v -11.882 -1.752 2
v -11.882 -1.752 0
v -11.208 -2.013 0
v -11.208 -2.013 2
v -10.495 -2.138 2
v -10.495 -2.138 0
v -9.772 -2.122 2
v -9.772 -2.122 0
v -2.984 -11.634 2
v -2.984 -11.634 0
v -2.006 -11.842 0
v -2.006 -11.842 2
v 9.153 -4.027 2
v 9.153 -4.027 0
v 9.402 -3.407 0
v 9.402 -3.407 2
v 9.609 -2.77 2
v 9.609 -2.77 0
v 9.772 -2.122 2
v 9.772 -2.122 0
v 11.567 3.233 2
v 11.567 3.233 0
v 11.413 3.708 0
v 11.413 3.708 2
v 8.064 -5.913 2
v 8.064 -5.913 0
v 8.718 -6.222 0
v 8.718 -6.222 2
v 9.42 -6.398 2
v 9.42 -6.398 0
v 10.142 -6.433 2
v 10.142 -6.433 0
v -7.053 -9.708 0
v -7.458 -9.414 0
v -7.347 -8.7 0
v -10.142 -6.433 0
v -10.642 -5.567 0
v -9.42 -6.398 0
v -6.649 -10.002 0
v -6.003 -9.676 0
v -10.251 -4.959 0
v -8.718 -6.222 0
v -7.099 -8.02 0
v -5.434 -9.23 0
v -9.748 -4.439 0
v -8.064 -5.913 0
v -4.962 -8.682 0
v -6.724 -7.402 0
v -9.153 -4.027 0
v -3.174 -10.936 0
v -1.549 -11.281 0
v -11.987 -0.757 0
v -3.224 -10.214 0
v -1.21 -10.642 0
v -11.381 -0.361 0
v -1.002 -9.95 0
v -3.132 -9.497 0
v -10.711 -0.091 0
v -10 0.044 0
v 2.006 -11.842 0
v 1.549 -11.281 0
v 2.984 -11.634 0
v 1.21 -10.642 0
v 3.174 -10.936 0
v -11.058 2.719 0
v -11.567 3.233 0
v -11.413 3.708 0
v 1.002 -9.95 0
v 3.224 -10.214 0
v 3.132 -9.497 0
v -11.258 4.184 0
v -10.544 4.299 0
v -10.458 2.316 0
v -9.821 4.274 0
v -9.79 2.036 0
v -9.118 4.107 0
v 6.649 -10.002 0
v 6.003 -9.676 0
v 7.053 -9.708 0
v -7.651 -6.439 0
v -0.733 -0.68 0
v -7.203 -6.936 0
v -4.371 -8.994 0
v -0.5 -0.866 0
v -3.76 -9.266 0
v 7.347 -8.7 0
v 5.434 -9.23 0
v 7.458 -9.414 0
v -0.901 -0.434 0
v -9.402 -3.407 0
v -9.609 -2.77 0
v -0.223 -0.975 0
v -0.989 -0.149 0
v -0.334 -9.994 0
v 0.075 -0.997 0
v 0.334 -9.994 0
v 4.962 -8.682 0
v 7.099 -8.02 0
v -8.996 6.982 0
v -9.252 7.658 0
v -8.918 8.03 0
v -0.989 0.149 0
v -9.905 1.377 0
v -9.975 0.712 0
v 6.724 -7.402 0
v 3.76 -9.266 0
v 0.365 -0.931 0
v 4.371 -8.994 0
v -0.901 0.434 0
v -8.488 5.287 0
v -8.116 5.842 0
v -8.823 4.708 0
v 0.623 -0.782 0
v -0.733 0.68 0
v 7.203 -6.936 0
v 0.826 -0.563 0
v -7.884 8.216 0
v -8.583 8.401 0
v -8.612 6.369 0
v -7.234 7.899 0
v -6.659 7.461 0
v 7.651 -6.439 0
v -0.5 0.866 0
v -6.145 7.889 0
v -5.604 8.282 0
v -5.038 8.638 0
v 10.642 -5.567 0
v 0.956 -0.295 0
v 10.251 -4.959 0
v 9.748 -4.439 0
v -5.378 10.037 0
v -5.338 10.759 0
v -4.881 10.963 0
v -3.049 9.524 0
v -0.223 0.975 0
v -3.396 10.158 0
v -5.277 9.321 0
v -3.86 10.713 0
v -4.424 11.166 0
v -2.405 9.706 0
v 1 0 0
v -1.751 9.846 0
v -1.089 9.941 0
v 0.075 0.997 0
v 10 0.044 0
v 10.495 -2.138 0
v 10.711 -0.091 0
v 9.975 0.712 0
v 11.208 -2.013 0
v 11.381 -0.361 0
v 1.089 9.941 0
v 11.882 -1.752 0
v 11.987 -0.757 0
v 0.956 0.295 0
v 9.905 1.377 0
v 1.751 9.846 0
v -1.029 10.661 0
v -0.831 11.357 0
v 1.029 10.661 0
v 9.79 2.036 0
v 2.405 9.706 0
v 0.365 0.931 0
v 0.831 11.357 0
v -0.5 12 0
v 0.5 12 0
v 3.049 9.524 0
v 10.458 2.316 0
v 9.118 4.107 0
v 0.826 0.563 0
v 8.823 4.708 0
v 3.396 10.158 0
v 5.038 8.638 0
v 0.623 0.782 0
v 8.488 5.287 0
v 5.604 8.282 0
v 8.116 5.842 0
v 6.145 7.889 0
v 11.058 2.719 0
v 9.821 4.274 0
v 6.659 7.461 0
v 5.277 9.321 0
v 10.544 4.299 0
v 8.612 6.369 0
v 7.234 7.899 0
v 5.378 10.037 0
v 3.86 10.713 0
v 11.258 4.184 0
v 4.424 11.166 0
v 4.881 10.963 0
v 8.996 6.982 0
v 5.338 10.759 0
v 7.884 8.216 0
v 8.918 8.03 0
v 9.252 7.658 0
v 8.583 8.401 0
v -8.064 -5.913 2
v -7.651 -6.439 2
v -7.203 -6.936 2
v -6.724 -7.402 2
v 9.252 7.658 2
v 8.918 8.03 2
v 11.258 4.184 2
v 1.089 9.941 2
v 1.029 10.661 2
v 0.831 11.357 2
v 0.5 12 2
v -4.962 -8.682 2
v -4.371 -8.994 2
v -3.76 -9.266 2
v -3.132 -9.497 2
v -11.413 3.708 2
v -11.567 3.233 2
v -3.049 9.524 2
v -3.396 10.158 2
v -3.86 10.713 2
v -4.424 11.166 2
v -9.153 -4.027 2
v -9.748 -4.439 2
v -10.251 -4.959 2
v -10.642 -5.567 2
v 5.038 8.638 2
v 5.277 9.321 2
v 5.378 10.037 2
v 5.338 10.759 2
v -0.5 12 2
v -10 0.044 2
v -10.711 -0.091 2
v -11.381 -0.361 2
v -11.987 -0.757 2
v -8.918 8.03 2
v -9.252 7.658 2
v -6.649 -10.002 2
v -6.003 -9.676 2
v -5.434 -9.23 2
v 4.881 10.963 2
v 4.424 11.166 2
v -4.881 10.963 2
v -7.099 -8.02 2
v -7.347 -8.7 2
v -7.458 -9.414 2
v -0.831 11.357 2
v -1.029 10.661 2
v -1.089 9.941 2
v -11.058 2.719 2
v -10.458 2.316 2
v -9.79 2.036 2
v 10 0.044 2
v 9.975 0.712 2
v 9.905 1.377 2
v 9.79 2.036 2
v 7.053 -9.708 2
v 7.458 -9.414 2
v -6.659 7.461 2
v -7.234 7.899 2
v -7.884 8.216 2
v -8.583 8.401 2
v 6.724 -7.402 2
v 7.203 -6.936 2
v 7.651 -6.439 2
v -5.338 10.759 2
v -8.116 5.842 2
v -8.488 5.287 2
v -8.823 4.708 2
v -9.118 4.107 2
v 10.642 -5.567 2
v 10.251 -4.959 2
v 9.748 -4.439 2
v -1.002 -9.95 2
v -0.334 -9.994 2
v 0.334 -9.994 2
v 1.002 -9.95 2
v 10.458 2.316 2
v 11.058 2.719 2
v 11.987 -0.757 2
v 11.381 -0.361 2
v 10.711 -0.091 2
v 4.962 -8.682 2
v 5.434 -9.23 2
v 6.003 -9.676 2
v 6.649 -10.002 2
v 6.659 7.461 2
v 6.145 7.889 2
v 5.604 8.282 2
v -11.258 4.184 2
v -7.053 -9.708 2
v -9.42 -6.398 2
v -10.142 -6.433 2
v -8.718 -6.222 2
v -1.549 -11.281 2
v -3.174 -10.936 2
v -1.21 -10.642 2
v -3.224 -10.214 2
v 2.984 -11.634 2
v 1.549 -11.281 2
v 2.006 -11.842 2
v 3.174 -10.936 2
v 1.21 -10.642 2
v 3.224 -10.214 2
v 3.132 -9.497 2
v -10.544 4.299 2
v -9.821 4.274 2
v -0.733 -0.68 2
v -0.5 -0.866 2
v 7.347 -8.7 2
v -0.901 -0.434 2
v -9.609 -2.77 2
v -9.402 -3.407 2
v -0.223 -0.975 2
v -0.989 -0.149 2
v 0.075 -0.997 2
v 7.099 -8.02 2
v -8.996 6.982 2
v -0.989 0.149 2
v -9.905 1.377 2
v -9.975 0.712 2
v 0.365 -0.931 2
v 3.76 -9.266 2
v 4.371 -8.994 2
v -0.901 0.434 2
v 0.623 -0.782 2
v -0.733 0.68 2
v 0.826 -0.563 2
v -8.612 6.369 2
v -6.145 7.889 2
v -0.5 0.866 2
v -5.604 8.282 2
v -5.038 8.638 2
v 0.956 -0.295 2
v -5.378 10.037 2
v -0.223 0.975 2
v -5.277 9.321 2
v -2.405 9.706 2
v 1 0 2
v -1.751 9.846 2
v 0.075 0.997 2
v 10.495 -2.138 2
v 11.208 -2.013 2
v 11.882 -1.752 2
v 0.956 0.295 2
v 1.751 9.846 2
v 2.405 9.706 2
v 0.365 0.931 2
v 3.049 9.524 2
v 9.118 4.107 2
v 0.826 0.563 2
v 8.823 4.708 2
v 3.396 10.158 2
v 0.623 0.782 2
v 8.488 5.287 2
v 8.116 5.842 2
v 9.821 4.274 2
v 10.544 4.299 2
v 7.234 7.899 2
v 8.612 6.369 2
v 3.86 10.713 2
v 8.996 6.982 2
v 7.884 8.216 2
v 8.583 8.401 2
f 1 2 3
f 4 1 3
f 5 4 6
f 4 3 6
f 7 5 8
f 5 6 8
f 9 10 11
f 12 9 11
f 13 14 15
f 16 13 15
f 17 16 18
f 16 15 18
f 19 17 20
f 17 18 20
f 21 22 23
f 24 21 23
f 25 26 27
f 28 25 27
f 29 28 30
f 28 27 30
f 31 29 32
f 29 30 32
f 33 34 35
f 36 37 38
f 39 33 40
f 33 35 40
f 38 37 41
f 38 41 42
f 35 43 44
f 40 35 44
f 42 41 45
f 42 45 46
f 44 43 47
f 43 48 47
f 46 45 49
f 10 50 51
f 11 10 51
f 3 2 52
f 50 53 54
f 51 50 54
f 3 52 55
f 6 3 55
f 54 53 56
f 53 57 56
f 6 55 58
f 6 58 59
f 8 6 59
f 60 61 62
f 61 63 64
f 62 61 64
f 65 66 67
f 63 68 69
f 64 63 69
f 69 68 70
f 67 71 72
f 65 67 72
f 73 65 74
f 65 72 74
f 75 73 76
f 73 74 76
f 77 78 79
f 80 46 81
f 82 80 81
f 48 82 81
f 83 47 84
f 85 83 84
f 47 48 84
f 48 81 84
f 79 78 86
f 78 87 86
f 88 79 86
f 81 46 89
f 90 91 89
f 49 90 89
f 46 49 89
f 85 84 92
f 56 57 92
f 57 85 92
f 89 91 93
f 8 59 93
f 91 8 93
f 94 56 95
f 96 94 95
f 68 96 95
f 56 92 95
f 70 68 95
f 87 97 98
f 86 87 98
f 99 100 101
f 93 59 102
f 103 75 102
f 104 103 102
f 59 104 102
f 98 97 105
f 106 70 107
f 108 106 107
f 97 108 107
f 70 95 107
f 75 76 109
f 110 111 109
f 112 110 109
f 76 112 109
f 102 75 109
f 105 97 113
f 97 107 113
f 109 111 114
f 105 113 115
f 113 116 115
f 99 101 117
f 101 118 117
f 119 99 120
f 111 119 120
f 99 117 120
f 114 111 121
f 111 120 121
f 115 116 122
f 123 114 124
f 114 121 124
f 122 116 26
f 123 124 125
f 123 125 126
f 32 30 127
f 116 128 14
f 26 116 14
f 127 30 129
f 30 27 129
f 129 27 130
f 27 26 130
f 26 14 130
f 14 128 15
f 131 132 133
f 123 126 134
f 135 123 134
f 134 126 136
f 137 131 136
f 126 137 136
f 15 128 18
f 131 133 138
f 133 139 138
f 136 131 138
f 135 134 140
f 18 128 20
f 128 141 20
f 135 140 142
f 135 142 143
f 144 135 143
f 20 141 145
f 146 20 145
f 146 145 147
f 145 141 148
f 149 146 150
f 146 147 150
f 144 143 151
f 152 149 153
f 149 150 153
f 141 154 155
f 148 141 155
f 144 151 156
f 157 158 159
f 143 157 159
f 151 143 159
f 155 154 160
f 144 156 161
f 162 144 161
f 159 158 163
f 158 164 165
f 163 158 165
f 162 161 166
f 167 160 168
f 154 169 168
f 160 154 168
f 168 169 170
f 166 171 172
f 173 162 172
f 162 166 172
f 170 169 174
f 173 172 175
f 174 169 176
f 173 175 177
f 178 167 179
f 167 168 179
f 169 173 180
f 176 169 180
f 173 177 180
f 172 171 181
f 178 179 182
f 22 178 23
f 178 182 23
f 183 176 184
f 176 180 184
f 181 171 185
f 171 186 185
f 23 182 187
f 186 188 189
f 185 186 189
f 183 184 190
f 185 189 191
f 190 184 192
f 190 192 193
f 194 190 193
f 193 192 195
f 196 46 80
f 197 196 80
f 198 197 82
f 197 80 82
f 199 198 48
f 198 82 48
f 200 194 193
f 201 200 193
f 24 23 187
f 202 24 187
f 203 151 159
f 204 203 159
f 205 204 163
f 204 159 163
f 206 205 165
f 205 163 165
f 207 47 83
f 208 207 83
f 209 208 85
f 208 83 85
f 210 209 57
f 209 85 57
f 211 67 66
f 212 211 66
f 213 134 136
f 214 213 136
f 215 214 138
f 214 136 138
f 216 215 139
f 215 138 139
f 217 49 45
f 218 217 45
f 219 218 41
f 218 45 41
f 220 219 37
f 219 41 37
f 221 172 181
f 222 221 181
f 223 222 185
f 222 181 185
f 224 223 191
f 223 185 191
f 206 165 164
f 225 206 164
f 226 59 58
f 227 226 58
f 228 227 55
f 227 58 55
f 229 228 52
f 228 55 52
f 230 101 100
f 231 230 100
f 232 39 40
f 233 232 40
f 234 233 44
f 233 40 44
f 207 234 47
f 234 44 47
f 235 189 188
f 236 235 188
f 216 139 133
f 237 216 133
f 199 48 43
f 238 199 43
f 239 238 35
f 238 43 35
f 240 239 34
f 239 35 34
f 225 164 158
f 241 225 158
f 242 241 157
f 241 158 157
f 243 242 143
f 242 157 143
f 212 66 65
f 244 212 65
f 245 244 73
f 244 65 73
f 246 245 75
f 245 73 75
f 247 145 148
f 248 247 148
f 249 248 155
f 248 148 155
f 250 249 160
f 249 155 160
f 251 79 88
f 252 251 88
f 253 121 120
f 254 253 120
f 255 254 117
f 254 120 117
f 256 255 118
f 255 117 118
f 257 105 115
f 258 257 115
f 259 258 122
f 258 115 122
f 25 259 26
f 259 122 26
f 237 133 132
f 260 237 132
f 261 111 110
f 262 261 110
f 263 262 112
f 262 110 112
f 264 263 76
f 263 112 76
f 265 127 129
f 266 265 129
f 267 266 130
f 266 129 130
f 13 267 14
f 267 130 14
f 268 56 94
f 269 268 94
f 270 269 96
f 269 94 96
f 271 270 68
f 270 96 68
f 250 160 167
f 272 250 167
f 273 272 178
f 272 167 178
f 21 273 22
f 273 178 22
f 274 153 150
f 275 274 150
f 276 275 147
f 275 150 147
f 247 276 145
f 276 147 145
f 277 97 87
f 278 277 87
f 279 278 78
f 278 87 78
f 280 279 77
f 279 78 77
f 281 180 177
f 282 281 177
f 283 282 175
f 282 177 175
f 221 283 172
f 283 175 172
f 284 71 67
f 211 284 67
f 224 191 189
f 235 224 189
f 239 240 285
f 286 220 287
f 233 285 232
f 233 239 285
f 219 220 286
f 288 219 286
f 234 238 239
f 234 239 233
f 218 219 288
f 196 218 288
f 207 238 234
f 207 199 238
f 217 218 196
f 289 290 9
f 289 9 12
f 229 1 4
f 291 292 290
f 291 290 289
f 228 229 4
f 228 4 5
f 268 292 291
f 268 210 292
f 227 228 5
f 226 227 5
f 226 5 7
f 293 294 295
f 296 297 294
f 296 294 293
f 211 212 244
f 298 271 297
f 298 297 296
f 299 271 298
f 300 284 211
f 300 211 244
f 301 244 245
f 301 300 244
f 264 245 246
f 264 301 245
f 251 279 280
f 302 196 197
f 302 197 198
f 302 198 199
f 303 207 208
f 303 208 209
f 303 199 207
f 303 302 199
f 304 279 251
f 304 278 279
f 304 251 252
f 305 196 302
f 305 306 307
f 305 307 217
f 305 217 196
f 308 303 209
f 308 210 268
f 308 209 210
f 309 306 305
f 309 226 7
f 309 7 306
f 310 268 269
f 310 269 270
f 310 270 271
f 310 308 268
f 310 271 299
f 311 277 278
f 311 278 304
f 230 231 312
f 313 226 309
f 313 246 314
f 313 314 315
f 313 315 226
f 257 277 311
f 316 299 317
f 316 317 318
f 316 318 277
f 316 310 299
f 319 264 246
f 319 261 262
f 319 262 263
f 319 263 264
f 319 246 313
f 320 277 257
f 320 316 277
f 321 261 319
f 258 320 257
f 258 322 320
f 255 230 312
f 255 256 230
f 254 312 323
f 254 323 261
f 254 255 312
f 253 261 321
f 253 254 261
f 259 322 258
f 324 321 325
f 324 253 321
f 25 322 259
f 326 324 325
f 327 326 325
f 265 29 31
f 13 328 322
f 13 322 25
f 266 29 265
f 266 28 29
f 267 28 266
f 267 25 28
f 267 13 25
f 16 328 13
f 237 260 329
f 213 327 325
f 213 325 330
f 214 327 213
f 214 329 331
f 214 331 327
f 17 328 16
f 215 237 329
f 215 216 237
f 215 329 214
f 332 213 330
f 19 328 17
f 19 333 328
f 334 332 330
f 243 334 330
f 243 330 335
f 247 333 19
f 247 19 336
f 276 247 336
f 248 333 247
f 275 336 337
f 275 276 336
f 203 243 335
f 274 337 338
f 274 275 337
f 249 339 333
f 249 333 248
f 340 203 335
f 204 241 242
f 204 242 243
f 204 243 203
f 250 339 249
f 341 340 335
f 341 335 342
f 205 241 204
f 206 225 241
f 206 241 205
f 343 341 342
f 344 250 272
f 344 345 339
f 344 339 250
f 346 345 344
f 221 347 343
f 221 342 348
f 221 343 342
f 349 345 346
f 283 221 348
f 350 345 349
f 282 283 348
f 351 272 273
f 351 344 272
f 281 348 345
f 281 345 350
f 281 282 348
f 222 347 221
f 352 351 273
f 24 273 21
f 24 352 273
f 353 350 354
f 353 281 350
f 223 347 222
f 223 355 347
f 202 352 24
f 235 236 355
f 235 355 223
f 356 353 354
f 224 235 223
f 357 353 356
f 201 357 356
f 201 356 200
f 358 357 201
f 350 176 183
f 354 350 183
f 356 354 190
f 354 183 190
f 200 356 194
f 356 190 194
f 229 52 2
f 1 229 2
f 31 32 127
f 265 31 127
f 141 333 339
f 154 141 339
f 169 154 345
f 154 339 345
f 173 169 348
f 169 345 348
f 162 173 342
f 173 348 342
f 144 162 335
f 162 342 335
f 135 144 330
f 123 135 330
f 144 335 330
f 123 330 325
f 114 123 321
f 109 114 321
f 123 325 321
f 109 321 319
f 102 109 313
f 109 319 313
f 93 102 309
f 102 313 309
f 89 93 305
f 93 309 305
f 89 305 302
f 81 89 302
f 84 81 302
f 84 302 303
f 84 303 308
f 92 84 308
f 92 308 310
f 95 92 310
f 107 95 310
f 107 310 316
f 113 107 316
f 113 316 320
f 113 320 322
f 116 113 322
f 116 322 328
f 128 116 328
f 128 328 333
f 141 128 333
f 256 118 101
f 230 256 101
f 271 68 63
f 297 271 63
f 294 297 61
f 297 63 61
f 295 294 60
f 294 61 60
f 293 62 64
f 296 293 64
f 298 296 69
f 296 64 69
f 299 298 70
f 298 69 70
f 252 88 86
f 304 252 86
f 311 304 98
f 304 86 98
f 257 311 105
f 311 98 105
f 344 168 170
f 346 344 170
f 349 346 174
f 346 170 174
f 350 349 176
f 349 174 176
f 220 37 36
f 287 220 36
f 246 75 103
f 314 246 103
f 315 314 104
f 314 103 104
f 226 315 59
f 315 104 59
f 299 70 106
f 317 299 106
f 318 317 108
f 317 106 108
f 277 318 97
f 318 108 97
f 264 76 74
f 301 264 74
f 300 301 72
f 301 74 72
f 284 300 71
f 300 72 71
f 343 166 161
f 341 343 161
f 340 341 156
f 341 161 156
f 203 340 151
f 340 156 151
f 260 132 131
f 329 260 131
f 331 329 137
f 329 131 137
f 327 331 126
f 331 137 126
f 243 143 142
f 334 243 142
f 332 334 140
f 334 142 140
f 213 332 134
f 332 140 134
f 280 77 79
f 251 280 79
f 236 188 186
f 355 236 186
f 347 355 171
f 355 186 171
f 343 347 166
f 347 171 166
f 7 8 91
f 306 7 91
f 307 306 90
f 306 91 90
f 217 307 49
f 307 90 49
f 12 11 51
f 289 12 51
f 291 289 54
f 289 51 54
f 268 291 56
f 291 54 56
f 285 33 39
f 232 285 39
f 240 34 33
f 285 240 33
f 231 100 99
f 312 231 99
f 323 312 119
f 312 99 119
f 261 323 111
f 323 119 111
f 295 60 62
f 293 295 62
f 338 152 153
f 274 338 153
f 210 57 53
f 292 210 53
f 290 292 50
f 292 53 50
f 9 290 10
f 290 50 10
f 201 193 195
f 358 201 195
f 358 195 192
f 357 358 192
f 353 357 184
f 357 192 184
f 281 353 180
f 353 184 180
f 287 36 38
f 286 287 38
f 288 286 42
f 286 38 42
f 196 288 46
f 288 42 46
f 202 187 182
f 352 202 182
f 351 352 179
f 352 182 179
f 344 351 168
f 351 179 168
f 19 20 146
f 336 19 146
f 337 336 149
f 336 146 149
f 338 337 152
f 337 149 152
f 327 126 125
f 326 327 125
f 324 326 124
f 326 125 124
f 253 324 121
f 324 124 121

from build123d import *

# Parameters (mm, degrees)
F1_DEPTH = 2
F2_R     = 1
F3_DEPTH = 2.001


with BuildPart() as f1:
    # F0 (on Top) → F1 (new body)
    with BuildSketch(Plane.XY):
        with BuildLine():
            ThreePointArc((9.772306, -2.121802), (9.942913, -1.066992), (10, 0))
            ThreePointArc((10, 0), (9.999976, 0.02183), (9.999905, 0.043659))
            ThreePointArc((9.999905, 0.043659), (9.945219, 1.045285), (9.79046, 2.036392))
            ThreePointArc((9.79046, 2.036392), (9.510565, 3.09017), (9.11761, 4.107212))
            ThreePointArc((9.11761, 4.107212), (8.660254, 5), (8.115755, 5.842476))
            ThreePointArc((8.115755, 5.842476), (7.431448, 6.691306), (6.658797, 7.460591))
            ThreePointArc((6.658797, 7.460591), (5.877853, 8.09017), (5.037762, 8.638342))
            ThreePointArc((5.037762, 8.638342), (4.067366, 9.135455), (3.048618, 9.523966))
            ThreePointArc((3.048618, 9.523966), (2.079117, 9.781476), (1.088694, 9.940561))
            ThreePointArc((1.088694, 9.940561), (0, 10), (-1.088694, 9.940561))
            ThreePointArc((-1.088694, 9.940561), (-2.079117, 9.781476), (-3.048618, 9.523966))
            ThreePointArc((-3.048618, 9.523966), (-4.067366, 9.135455), (-5.037762, 8.638342))
            ThreePointArc((-5.037762, 8.638342), (-5.877853, 8.09017), (-6.658797, 7.460591))
            ThreePointArc((-6.658797, 7.460591), (-7.431448, 6.691306), (-8.115755, 5.842476))
            ThreePointArc((-8.115755, 5.842476), (-8.660254, 5), (-9.11761, 4.107212))
            ThreePointArc((-9.11761, 4.107212), (-9.510565, 3.09017), (-9.79046, 2.036392))
            ThreePointArc((-9.79046, 2.036392), (-9.945219, 1.045285), (-9.999905, 0.043659))
            ThreePointArc((-9.999905, 0.043659), (-9.945219, -1.045285), (-9.772306, -2.121802))
            ThreePointArc((-9.772306, -2.121802), (-9.510565, -3.09017), (-9.153125, -4.027443))
            ThreePointArc((-9.153125, -4.027443), (-8.660254, -5), (-8.064431, -5.913117))
            ThreePointArc((-8.064431, -5.913117), (-7.431448, -6.691306), (-6.723687, -7.402164))
            ThreePointArc((-6.723687, -7.402164), (-5.877853, -8.09017), (-4.962143, -8.682001))
            ThreePointArc((-4.962143, -8.682001), (-4.067366, -9.135455), (-3.131663, -9.496983))
            ThreePointArc((-3.131663, -9.496983), (-2.079117, -9.781476), (-1.001855, -9.949688))
            ThreePointArc((-1.001855, -9.949688), (0, -10), (1.001855, -9.949688))
            ThreePointArc((1.001855, -9.949688), (2.079117, -9.781476), (3.131663, -9.496983))
            ThreePointArc((3.131663, -9.496983), (4.067366, -9.135455), (4.962143, -8.682001))
            ThreePointArc((4.962143, -8.682001), (5.877853, -8.09017), (6.723687, -7.402164))
            ThreePointArc((6.723687, -7.402164), (7.431448, -6.691306), (8.064431, -5.913117))
            ThreePointArc((8.064431, -5.913117), (8.660254, -5), (9.153125, -4.027443))
            ThreePointArc((9.153125, -4.027443), (9.510565, -3.09017), (9.772306, -2.121802))
        make_face()
        with BuildLine():
            ThreePointArc((9.999905, 0.043659), (9.999976, 0.02183), (10, 0))
            ThreePointArc((10, 0), (9.942913, -1.066992), (9.772306, -2.121802))
            ThreePointArc((9.772306, -2.121802), (10.85461, -2.093182), (11.881999, -1.751603))
            Line((11.881999, -1.751603), (11.934263, -1.254342))
            Line((11.934263, -1.254342), (11.986527, -0.757081))
            ThreePointArc((11.986527, -0.757081), (11.052608, -0.209359), (9.999905, 0.043659))
        make_face()
        with BuildLine():
            ThreePointArc((9.11761, 4.107212), (9.510565, 3.09017), (9.79046, 2.036392))
            ThreePointArc((9.79046, 2.036392), (10.767554, 2.502751), (11.567187, 3.232676))
            Line((11.567187, 3.232676), (11.412678, 3.708204))
            Line((11.412678, 3.708204), (11.25817, 4.183732))
            ThreePointArc((11.25817, 4.183732), (10.182214, 4.304241), (9.11761, 4.107212))
        make_face()
        with BuildLine():
            ThreePointArc((10.642305, -5.566987), (10.011906, -4.68676), (9.153125, -4.027443))
            ThreePointArc((9.153125, -4.027443), (8.660254, -5), (8.064431, -5.913117))
            ThreePointArc((8.064431, -5.913117), (9.064806, -6.327185), (10.142305, -6.433013))
            Line((10.142305, -6.433013), (10.392305, -6))
            Line((10.392305, -6), (10.642305, -5.566987))
        make_face()
        with BuildLine():
            ThreePointArc((6.658797, 7.460591), (7.431448, 6.691306), (8.115755, 5.842476))
            ThreePointArc((8.115755, 5.842476), (8.818689, 6.665935), (9.252303, 7.657995))
            Line((9.252303, 7.657995), (8.917738, 8.029567))
            Line((8.917738, 8.029567), (8.583173, 8.40114))
            ThreePointArc((8.583173, 8.40114), (7.551223, 8.0736), (6.658797, 7.460591))
        make_face()
        with BuildLine():
            ThreePointArc((7.457932, -9.414311), (7.240054, -8.353777), (6.723687, -7.402164))
            ThreePointArc((6.723687, -7.402164), (5.877853, -8.09017), (4.962143, -8.682001))
            ThreePointArc((4.962143, -8.682001), (5.707615, -9.46716), (6.648915, -10.002097))
            Line((6.648915, -10.002097), (7.053423, -9.708204))
            Line((7.053423, -9.708204), (7.457932, -9.414311))
        make_face()
        with BuildLine():
            ThreePointArc((3.048618, 9.523966), (4.067366, 9.135455), (5.037762, 8.638342))
            ThreePointArc((5.037762, 8.638342), (5.344994, 9.676519), (5.337612, 10.759177))
            Line((5.337612, 10.759177), (4.88084, 10.962545))
            Line((4.88084, 10.962545), (4.424067, 11.165914))
            ThreePointArc((4.424067, 11.165914), (3.614556, 10.446959), (3.048618, 9.523966))
        make_face()
        with BuildLine():
            ThreePointArc((2.984014, -11.633815), (3.216331, -10.576351), (3.131663, -9.496983))
            ThreePointArc((3.131663, -9.496983), (2.079117, -9.781476), (1.001855, -9.949688))
            ThreePointArc((1.001855, -9.949688), (1.363525, -10.970177), (2.005866, -11.841727))
            Line((2.005866, -11.841727), (2.49494, -11.737771))
            Line((2.49494, -11.737771), (2.984014, -11.633815))
        make_face()
        with BuildLine():
            ThreePointArc((-1.088694, 9.940561), (0, 10), (1.088694, 9.940561))
            ThreePointArc((1.088694, 9.940561), (0.9471, 11.013945), (0.5, 12))
            Line((0.5, 12), (0, 12))
            Line((0, 12), (-0.5, 12))
            ThreePointArc((-0.5, 12), (-0.9471, 11.013945), (-1.088694, 9.940561))
        make_face()
        with BuildLine():
            ThreePointArc((-2.005866, -11.841727), (-1.363525, -10.970177), (-1.001855, -9.949688))
            ThreePointArc((-1.001855, -9.949688), (-2.079117, -9.781476), (-3.131663, -9.496983))
            ThreePointArc((-3.131663, -9.496983), (-3.216331, -10.576351), (-2.984014, -11.633815))
            Line((-2.984014, -11.633815), (-2.49494, -11.737771))
            Line((-2.49494, -11.737771), (-2.005866, -11.841727))
        make_face()
        with BuildLine():
            ThreePointArc((-5.037762, 8.638342), (-4.067366, 9.135455), (-3.048618, 9.523966))
            ThreePointArc((-3.048618, 9.523966), (-3.614556, 10.446959), (-4.424067, 11.165914))
            Line((-4.424067, 11.165914), (-4.88084, 10.962545))
            Line((-4.88084, 10.962545), (-5.337612, 10.759177))
            ThreePointArc((-5.337612, 10.759177), (-5.344994, 9.676519), (-5.037762, 8.638342))
        make_face()
        with BuildLine():
            ThreePointArc((-6.648915, -10.002097), (-5.707615, -9.46716), (-4.962143, -8.682001))
            ThreePointArc((-4.962143, -8.682001), (-5.877853, -8.09017), (-6.723687, -7.402164))
            ThreePointArc((-6.723687, -7.402164), (-7.240054, -8.353777), (-7.457932, -9.414311))
            Line((-7.457932, -9.414311), (-7.053423, -9.708204))
            Line((-7.053423, -9.708204), (-6.648915, -10.002097))
        make_face()
        with BuildLine():
            ThreePointArc((-8.115755, 5.842476), (-7.431448, 6.691306), (-6.658797, 7.460591))
            ThreePointArc((-6.658797, 7.460591), (-7.551223, 8.0736), (-8.583173, 8.40114))
            Line((-8.583173, 8.40114), (-8.917738, 8.029567))
            Line((-8.917738, 8.029567), (-9.252303, 7.657995))
            ThreePointArc((-9.252303, 7.657995), (-8.818689, 6.665935), (-8.115755, 5.842476))
        make_face()
        with BuildLine():
            ThreePointArc((-10.142305, -6.433013), (-9.064806, -6.327185), (-8.064431, -5.913117))
            ThreePointArc((-8.064431, -5.913117), (-8.660254, -5), (-9.153125, -4.027443))
            ThreePointArc((-9.153125, -4.027443), (-10.011906, -4.68676), (-10.642305, -5.566987))
            Line((-10.642305, -5.566987), (-10.392305, -6))
            Line((-10.392305, -6), (-10.142305, -6.433013))
        make_face()
        with BuildLine():
            ThreePointArc((-9.79046, 2.036392), (-9.510565, 3.09017), (-9.11761, 4.107212))
            ThreePointArc((-9.11761, 4.107212), (-10.182214, 4.304241), (-11.25817, 4.183732))
            Line((-11.25817, 4.183732), (-11.412678, 3.708204))
            Line((-11.412678, 3.708204), (-11.567187, 3.232676))
            ThreePointArc((-11.567187, 3.232676), (-10.767554, 2.502751), (-9.79046, 2.036392))
        make_face()
        with BuildLine():
            ThreePointArc((-11.881999, -1.751603), (-10.85461, -2.093182), (-9.772306, -2.121802))
            ThreePointArc((-9.772306, -2.121802), (-9.945219, -1.045285), (-9.999905, 0.043659))
            ThreePointArc((-9.999905, 0.043659), (-11.052608, -0.209359), (-11.986527, -0.757081))
            Line((-11.986527, -0.757081), (-11.934263, -1.254342))
            Line((-11.934263, -1.254342), (-11.881999, -1.751603))
        make_face()
    extrude(amount=F1_DEPTH)

    # F2 (on face) → F3 (cut, through all)
    with BuildSketch(Plane.XY.offset(2)):
        Circle(F2_R)
    extrude(amount=-F3_DEPTH, mode=Mode.SUBTRACT)


solid = f1.part
